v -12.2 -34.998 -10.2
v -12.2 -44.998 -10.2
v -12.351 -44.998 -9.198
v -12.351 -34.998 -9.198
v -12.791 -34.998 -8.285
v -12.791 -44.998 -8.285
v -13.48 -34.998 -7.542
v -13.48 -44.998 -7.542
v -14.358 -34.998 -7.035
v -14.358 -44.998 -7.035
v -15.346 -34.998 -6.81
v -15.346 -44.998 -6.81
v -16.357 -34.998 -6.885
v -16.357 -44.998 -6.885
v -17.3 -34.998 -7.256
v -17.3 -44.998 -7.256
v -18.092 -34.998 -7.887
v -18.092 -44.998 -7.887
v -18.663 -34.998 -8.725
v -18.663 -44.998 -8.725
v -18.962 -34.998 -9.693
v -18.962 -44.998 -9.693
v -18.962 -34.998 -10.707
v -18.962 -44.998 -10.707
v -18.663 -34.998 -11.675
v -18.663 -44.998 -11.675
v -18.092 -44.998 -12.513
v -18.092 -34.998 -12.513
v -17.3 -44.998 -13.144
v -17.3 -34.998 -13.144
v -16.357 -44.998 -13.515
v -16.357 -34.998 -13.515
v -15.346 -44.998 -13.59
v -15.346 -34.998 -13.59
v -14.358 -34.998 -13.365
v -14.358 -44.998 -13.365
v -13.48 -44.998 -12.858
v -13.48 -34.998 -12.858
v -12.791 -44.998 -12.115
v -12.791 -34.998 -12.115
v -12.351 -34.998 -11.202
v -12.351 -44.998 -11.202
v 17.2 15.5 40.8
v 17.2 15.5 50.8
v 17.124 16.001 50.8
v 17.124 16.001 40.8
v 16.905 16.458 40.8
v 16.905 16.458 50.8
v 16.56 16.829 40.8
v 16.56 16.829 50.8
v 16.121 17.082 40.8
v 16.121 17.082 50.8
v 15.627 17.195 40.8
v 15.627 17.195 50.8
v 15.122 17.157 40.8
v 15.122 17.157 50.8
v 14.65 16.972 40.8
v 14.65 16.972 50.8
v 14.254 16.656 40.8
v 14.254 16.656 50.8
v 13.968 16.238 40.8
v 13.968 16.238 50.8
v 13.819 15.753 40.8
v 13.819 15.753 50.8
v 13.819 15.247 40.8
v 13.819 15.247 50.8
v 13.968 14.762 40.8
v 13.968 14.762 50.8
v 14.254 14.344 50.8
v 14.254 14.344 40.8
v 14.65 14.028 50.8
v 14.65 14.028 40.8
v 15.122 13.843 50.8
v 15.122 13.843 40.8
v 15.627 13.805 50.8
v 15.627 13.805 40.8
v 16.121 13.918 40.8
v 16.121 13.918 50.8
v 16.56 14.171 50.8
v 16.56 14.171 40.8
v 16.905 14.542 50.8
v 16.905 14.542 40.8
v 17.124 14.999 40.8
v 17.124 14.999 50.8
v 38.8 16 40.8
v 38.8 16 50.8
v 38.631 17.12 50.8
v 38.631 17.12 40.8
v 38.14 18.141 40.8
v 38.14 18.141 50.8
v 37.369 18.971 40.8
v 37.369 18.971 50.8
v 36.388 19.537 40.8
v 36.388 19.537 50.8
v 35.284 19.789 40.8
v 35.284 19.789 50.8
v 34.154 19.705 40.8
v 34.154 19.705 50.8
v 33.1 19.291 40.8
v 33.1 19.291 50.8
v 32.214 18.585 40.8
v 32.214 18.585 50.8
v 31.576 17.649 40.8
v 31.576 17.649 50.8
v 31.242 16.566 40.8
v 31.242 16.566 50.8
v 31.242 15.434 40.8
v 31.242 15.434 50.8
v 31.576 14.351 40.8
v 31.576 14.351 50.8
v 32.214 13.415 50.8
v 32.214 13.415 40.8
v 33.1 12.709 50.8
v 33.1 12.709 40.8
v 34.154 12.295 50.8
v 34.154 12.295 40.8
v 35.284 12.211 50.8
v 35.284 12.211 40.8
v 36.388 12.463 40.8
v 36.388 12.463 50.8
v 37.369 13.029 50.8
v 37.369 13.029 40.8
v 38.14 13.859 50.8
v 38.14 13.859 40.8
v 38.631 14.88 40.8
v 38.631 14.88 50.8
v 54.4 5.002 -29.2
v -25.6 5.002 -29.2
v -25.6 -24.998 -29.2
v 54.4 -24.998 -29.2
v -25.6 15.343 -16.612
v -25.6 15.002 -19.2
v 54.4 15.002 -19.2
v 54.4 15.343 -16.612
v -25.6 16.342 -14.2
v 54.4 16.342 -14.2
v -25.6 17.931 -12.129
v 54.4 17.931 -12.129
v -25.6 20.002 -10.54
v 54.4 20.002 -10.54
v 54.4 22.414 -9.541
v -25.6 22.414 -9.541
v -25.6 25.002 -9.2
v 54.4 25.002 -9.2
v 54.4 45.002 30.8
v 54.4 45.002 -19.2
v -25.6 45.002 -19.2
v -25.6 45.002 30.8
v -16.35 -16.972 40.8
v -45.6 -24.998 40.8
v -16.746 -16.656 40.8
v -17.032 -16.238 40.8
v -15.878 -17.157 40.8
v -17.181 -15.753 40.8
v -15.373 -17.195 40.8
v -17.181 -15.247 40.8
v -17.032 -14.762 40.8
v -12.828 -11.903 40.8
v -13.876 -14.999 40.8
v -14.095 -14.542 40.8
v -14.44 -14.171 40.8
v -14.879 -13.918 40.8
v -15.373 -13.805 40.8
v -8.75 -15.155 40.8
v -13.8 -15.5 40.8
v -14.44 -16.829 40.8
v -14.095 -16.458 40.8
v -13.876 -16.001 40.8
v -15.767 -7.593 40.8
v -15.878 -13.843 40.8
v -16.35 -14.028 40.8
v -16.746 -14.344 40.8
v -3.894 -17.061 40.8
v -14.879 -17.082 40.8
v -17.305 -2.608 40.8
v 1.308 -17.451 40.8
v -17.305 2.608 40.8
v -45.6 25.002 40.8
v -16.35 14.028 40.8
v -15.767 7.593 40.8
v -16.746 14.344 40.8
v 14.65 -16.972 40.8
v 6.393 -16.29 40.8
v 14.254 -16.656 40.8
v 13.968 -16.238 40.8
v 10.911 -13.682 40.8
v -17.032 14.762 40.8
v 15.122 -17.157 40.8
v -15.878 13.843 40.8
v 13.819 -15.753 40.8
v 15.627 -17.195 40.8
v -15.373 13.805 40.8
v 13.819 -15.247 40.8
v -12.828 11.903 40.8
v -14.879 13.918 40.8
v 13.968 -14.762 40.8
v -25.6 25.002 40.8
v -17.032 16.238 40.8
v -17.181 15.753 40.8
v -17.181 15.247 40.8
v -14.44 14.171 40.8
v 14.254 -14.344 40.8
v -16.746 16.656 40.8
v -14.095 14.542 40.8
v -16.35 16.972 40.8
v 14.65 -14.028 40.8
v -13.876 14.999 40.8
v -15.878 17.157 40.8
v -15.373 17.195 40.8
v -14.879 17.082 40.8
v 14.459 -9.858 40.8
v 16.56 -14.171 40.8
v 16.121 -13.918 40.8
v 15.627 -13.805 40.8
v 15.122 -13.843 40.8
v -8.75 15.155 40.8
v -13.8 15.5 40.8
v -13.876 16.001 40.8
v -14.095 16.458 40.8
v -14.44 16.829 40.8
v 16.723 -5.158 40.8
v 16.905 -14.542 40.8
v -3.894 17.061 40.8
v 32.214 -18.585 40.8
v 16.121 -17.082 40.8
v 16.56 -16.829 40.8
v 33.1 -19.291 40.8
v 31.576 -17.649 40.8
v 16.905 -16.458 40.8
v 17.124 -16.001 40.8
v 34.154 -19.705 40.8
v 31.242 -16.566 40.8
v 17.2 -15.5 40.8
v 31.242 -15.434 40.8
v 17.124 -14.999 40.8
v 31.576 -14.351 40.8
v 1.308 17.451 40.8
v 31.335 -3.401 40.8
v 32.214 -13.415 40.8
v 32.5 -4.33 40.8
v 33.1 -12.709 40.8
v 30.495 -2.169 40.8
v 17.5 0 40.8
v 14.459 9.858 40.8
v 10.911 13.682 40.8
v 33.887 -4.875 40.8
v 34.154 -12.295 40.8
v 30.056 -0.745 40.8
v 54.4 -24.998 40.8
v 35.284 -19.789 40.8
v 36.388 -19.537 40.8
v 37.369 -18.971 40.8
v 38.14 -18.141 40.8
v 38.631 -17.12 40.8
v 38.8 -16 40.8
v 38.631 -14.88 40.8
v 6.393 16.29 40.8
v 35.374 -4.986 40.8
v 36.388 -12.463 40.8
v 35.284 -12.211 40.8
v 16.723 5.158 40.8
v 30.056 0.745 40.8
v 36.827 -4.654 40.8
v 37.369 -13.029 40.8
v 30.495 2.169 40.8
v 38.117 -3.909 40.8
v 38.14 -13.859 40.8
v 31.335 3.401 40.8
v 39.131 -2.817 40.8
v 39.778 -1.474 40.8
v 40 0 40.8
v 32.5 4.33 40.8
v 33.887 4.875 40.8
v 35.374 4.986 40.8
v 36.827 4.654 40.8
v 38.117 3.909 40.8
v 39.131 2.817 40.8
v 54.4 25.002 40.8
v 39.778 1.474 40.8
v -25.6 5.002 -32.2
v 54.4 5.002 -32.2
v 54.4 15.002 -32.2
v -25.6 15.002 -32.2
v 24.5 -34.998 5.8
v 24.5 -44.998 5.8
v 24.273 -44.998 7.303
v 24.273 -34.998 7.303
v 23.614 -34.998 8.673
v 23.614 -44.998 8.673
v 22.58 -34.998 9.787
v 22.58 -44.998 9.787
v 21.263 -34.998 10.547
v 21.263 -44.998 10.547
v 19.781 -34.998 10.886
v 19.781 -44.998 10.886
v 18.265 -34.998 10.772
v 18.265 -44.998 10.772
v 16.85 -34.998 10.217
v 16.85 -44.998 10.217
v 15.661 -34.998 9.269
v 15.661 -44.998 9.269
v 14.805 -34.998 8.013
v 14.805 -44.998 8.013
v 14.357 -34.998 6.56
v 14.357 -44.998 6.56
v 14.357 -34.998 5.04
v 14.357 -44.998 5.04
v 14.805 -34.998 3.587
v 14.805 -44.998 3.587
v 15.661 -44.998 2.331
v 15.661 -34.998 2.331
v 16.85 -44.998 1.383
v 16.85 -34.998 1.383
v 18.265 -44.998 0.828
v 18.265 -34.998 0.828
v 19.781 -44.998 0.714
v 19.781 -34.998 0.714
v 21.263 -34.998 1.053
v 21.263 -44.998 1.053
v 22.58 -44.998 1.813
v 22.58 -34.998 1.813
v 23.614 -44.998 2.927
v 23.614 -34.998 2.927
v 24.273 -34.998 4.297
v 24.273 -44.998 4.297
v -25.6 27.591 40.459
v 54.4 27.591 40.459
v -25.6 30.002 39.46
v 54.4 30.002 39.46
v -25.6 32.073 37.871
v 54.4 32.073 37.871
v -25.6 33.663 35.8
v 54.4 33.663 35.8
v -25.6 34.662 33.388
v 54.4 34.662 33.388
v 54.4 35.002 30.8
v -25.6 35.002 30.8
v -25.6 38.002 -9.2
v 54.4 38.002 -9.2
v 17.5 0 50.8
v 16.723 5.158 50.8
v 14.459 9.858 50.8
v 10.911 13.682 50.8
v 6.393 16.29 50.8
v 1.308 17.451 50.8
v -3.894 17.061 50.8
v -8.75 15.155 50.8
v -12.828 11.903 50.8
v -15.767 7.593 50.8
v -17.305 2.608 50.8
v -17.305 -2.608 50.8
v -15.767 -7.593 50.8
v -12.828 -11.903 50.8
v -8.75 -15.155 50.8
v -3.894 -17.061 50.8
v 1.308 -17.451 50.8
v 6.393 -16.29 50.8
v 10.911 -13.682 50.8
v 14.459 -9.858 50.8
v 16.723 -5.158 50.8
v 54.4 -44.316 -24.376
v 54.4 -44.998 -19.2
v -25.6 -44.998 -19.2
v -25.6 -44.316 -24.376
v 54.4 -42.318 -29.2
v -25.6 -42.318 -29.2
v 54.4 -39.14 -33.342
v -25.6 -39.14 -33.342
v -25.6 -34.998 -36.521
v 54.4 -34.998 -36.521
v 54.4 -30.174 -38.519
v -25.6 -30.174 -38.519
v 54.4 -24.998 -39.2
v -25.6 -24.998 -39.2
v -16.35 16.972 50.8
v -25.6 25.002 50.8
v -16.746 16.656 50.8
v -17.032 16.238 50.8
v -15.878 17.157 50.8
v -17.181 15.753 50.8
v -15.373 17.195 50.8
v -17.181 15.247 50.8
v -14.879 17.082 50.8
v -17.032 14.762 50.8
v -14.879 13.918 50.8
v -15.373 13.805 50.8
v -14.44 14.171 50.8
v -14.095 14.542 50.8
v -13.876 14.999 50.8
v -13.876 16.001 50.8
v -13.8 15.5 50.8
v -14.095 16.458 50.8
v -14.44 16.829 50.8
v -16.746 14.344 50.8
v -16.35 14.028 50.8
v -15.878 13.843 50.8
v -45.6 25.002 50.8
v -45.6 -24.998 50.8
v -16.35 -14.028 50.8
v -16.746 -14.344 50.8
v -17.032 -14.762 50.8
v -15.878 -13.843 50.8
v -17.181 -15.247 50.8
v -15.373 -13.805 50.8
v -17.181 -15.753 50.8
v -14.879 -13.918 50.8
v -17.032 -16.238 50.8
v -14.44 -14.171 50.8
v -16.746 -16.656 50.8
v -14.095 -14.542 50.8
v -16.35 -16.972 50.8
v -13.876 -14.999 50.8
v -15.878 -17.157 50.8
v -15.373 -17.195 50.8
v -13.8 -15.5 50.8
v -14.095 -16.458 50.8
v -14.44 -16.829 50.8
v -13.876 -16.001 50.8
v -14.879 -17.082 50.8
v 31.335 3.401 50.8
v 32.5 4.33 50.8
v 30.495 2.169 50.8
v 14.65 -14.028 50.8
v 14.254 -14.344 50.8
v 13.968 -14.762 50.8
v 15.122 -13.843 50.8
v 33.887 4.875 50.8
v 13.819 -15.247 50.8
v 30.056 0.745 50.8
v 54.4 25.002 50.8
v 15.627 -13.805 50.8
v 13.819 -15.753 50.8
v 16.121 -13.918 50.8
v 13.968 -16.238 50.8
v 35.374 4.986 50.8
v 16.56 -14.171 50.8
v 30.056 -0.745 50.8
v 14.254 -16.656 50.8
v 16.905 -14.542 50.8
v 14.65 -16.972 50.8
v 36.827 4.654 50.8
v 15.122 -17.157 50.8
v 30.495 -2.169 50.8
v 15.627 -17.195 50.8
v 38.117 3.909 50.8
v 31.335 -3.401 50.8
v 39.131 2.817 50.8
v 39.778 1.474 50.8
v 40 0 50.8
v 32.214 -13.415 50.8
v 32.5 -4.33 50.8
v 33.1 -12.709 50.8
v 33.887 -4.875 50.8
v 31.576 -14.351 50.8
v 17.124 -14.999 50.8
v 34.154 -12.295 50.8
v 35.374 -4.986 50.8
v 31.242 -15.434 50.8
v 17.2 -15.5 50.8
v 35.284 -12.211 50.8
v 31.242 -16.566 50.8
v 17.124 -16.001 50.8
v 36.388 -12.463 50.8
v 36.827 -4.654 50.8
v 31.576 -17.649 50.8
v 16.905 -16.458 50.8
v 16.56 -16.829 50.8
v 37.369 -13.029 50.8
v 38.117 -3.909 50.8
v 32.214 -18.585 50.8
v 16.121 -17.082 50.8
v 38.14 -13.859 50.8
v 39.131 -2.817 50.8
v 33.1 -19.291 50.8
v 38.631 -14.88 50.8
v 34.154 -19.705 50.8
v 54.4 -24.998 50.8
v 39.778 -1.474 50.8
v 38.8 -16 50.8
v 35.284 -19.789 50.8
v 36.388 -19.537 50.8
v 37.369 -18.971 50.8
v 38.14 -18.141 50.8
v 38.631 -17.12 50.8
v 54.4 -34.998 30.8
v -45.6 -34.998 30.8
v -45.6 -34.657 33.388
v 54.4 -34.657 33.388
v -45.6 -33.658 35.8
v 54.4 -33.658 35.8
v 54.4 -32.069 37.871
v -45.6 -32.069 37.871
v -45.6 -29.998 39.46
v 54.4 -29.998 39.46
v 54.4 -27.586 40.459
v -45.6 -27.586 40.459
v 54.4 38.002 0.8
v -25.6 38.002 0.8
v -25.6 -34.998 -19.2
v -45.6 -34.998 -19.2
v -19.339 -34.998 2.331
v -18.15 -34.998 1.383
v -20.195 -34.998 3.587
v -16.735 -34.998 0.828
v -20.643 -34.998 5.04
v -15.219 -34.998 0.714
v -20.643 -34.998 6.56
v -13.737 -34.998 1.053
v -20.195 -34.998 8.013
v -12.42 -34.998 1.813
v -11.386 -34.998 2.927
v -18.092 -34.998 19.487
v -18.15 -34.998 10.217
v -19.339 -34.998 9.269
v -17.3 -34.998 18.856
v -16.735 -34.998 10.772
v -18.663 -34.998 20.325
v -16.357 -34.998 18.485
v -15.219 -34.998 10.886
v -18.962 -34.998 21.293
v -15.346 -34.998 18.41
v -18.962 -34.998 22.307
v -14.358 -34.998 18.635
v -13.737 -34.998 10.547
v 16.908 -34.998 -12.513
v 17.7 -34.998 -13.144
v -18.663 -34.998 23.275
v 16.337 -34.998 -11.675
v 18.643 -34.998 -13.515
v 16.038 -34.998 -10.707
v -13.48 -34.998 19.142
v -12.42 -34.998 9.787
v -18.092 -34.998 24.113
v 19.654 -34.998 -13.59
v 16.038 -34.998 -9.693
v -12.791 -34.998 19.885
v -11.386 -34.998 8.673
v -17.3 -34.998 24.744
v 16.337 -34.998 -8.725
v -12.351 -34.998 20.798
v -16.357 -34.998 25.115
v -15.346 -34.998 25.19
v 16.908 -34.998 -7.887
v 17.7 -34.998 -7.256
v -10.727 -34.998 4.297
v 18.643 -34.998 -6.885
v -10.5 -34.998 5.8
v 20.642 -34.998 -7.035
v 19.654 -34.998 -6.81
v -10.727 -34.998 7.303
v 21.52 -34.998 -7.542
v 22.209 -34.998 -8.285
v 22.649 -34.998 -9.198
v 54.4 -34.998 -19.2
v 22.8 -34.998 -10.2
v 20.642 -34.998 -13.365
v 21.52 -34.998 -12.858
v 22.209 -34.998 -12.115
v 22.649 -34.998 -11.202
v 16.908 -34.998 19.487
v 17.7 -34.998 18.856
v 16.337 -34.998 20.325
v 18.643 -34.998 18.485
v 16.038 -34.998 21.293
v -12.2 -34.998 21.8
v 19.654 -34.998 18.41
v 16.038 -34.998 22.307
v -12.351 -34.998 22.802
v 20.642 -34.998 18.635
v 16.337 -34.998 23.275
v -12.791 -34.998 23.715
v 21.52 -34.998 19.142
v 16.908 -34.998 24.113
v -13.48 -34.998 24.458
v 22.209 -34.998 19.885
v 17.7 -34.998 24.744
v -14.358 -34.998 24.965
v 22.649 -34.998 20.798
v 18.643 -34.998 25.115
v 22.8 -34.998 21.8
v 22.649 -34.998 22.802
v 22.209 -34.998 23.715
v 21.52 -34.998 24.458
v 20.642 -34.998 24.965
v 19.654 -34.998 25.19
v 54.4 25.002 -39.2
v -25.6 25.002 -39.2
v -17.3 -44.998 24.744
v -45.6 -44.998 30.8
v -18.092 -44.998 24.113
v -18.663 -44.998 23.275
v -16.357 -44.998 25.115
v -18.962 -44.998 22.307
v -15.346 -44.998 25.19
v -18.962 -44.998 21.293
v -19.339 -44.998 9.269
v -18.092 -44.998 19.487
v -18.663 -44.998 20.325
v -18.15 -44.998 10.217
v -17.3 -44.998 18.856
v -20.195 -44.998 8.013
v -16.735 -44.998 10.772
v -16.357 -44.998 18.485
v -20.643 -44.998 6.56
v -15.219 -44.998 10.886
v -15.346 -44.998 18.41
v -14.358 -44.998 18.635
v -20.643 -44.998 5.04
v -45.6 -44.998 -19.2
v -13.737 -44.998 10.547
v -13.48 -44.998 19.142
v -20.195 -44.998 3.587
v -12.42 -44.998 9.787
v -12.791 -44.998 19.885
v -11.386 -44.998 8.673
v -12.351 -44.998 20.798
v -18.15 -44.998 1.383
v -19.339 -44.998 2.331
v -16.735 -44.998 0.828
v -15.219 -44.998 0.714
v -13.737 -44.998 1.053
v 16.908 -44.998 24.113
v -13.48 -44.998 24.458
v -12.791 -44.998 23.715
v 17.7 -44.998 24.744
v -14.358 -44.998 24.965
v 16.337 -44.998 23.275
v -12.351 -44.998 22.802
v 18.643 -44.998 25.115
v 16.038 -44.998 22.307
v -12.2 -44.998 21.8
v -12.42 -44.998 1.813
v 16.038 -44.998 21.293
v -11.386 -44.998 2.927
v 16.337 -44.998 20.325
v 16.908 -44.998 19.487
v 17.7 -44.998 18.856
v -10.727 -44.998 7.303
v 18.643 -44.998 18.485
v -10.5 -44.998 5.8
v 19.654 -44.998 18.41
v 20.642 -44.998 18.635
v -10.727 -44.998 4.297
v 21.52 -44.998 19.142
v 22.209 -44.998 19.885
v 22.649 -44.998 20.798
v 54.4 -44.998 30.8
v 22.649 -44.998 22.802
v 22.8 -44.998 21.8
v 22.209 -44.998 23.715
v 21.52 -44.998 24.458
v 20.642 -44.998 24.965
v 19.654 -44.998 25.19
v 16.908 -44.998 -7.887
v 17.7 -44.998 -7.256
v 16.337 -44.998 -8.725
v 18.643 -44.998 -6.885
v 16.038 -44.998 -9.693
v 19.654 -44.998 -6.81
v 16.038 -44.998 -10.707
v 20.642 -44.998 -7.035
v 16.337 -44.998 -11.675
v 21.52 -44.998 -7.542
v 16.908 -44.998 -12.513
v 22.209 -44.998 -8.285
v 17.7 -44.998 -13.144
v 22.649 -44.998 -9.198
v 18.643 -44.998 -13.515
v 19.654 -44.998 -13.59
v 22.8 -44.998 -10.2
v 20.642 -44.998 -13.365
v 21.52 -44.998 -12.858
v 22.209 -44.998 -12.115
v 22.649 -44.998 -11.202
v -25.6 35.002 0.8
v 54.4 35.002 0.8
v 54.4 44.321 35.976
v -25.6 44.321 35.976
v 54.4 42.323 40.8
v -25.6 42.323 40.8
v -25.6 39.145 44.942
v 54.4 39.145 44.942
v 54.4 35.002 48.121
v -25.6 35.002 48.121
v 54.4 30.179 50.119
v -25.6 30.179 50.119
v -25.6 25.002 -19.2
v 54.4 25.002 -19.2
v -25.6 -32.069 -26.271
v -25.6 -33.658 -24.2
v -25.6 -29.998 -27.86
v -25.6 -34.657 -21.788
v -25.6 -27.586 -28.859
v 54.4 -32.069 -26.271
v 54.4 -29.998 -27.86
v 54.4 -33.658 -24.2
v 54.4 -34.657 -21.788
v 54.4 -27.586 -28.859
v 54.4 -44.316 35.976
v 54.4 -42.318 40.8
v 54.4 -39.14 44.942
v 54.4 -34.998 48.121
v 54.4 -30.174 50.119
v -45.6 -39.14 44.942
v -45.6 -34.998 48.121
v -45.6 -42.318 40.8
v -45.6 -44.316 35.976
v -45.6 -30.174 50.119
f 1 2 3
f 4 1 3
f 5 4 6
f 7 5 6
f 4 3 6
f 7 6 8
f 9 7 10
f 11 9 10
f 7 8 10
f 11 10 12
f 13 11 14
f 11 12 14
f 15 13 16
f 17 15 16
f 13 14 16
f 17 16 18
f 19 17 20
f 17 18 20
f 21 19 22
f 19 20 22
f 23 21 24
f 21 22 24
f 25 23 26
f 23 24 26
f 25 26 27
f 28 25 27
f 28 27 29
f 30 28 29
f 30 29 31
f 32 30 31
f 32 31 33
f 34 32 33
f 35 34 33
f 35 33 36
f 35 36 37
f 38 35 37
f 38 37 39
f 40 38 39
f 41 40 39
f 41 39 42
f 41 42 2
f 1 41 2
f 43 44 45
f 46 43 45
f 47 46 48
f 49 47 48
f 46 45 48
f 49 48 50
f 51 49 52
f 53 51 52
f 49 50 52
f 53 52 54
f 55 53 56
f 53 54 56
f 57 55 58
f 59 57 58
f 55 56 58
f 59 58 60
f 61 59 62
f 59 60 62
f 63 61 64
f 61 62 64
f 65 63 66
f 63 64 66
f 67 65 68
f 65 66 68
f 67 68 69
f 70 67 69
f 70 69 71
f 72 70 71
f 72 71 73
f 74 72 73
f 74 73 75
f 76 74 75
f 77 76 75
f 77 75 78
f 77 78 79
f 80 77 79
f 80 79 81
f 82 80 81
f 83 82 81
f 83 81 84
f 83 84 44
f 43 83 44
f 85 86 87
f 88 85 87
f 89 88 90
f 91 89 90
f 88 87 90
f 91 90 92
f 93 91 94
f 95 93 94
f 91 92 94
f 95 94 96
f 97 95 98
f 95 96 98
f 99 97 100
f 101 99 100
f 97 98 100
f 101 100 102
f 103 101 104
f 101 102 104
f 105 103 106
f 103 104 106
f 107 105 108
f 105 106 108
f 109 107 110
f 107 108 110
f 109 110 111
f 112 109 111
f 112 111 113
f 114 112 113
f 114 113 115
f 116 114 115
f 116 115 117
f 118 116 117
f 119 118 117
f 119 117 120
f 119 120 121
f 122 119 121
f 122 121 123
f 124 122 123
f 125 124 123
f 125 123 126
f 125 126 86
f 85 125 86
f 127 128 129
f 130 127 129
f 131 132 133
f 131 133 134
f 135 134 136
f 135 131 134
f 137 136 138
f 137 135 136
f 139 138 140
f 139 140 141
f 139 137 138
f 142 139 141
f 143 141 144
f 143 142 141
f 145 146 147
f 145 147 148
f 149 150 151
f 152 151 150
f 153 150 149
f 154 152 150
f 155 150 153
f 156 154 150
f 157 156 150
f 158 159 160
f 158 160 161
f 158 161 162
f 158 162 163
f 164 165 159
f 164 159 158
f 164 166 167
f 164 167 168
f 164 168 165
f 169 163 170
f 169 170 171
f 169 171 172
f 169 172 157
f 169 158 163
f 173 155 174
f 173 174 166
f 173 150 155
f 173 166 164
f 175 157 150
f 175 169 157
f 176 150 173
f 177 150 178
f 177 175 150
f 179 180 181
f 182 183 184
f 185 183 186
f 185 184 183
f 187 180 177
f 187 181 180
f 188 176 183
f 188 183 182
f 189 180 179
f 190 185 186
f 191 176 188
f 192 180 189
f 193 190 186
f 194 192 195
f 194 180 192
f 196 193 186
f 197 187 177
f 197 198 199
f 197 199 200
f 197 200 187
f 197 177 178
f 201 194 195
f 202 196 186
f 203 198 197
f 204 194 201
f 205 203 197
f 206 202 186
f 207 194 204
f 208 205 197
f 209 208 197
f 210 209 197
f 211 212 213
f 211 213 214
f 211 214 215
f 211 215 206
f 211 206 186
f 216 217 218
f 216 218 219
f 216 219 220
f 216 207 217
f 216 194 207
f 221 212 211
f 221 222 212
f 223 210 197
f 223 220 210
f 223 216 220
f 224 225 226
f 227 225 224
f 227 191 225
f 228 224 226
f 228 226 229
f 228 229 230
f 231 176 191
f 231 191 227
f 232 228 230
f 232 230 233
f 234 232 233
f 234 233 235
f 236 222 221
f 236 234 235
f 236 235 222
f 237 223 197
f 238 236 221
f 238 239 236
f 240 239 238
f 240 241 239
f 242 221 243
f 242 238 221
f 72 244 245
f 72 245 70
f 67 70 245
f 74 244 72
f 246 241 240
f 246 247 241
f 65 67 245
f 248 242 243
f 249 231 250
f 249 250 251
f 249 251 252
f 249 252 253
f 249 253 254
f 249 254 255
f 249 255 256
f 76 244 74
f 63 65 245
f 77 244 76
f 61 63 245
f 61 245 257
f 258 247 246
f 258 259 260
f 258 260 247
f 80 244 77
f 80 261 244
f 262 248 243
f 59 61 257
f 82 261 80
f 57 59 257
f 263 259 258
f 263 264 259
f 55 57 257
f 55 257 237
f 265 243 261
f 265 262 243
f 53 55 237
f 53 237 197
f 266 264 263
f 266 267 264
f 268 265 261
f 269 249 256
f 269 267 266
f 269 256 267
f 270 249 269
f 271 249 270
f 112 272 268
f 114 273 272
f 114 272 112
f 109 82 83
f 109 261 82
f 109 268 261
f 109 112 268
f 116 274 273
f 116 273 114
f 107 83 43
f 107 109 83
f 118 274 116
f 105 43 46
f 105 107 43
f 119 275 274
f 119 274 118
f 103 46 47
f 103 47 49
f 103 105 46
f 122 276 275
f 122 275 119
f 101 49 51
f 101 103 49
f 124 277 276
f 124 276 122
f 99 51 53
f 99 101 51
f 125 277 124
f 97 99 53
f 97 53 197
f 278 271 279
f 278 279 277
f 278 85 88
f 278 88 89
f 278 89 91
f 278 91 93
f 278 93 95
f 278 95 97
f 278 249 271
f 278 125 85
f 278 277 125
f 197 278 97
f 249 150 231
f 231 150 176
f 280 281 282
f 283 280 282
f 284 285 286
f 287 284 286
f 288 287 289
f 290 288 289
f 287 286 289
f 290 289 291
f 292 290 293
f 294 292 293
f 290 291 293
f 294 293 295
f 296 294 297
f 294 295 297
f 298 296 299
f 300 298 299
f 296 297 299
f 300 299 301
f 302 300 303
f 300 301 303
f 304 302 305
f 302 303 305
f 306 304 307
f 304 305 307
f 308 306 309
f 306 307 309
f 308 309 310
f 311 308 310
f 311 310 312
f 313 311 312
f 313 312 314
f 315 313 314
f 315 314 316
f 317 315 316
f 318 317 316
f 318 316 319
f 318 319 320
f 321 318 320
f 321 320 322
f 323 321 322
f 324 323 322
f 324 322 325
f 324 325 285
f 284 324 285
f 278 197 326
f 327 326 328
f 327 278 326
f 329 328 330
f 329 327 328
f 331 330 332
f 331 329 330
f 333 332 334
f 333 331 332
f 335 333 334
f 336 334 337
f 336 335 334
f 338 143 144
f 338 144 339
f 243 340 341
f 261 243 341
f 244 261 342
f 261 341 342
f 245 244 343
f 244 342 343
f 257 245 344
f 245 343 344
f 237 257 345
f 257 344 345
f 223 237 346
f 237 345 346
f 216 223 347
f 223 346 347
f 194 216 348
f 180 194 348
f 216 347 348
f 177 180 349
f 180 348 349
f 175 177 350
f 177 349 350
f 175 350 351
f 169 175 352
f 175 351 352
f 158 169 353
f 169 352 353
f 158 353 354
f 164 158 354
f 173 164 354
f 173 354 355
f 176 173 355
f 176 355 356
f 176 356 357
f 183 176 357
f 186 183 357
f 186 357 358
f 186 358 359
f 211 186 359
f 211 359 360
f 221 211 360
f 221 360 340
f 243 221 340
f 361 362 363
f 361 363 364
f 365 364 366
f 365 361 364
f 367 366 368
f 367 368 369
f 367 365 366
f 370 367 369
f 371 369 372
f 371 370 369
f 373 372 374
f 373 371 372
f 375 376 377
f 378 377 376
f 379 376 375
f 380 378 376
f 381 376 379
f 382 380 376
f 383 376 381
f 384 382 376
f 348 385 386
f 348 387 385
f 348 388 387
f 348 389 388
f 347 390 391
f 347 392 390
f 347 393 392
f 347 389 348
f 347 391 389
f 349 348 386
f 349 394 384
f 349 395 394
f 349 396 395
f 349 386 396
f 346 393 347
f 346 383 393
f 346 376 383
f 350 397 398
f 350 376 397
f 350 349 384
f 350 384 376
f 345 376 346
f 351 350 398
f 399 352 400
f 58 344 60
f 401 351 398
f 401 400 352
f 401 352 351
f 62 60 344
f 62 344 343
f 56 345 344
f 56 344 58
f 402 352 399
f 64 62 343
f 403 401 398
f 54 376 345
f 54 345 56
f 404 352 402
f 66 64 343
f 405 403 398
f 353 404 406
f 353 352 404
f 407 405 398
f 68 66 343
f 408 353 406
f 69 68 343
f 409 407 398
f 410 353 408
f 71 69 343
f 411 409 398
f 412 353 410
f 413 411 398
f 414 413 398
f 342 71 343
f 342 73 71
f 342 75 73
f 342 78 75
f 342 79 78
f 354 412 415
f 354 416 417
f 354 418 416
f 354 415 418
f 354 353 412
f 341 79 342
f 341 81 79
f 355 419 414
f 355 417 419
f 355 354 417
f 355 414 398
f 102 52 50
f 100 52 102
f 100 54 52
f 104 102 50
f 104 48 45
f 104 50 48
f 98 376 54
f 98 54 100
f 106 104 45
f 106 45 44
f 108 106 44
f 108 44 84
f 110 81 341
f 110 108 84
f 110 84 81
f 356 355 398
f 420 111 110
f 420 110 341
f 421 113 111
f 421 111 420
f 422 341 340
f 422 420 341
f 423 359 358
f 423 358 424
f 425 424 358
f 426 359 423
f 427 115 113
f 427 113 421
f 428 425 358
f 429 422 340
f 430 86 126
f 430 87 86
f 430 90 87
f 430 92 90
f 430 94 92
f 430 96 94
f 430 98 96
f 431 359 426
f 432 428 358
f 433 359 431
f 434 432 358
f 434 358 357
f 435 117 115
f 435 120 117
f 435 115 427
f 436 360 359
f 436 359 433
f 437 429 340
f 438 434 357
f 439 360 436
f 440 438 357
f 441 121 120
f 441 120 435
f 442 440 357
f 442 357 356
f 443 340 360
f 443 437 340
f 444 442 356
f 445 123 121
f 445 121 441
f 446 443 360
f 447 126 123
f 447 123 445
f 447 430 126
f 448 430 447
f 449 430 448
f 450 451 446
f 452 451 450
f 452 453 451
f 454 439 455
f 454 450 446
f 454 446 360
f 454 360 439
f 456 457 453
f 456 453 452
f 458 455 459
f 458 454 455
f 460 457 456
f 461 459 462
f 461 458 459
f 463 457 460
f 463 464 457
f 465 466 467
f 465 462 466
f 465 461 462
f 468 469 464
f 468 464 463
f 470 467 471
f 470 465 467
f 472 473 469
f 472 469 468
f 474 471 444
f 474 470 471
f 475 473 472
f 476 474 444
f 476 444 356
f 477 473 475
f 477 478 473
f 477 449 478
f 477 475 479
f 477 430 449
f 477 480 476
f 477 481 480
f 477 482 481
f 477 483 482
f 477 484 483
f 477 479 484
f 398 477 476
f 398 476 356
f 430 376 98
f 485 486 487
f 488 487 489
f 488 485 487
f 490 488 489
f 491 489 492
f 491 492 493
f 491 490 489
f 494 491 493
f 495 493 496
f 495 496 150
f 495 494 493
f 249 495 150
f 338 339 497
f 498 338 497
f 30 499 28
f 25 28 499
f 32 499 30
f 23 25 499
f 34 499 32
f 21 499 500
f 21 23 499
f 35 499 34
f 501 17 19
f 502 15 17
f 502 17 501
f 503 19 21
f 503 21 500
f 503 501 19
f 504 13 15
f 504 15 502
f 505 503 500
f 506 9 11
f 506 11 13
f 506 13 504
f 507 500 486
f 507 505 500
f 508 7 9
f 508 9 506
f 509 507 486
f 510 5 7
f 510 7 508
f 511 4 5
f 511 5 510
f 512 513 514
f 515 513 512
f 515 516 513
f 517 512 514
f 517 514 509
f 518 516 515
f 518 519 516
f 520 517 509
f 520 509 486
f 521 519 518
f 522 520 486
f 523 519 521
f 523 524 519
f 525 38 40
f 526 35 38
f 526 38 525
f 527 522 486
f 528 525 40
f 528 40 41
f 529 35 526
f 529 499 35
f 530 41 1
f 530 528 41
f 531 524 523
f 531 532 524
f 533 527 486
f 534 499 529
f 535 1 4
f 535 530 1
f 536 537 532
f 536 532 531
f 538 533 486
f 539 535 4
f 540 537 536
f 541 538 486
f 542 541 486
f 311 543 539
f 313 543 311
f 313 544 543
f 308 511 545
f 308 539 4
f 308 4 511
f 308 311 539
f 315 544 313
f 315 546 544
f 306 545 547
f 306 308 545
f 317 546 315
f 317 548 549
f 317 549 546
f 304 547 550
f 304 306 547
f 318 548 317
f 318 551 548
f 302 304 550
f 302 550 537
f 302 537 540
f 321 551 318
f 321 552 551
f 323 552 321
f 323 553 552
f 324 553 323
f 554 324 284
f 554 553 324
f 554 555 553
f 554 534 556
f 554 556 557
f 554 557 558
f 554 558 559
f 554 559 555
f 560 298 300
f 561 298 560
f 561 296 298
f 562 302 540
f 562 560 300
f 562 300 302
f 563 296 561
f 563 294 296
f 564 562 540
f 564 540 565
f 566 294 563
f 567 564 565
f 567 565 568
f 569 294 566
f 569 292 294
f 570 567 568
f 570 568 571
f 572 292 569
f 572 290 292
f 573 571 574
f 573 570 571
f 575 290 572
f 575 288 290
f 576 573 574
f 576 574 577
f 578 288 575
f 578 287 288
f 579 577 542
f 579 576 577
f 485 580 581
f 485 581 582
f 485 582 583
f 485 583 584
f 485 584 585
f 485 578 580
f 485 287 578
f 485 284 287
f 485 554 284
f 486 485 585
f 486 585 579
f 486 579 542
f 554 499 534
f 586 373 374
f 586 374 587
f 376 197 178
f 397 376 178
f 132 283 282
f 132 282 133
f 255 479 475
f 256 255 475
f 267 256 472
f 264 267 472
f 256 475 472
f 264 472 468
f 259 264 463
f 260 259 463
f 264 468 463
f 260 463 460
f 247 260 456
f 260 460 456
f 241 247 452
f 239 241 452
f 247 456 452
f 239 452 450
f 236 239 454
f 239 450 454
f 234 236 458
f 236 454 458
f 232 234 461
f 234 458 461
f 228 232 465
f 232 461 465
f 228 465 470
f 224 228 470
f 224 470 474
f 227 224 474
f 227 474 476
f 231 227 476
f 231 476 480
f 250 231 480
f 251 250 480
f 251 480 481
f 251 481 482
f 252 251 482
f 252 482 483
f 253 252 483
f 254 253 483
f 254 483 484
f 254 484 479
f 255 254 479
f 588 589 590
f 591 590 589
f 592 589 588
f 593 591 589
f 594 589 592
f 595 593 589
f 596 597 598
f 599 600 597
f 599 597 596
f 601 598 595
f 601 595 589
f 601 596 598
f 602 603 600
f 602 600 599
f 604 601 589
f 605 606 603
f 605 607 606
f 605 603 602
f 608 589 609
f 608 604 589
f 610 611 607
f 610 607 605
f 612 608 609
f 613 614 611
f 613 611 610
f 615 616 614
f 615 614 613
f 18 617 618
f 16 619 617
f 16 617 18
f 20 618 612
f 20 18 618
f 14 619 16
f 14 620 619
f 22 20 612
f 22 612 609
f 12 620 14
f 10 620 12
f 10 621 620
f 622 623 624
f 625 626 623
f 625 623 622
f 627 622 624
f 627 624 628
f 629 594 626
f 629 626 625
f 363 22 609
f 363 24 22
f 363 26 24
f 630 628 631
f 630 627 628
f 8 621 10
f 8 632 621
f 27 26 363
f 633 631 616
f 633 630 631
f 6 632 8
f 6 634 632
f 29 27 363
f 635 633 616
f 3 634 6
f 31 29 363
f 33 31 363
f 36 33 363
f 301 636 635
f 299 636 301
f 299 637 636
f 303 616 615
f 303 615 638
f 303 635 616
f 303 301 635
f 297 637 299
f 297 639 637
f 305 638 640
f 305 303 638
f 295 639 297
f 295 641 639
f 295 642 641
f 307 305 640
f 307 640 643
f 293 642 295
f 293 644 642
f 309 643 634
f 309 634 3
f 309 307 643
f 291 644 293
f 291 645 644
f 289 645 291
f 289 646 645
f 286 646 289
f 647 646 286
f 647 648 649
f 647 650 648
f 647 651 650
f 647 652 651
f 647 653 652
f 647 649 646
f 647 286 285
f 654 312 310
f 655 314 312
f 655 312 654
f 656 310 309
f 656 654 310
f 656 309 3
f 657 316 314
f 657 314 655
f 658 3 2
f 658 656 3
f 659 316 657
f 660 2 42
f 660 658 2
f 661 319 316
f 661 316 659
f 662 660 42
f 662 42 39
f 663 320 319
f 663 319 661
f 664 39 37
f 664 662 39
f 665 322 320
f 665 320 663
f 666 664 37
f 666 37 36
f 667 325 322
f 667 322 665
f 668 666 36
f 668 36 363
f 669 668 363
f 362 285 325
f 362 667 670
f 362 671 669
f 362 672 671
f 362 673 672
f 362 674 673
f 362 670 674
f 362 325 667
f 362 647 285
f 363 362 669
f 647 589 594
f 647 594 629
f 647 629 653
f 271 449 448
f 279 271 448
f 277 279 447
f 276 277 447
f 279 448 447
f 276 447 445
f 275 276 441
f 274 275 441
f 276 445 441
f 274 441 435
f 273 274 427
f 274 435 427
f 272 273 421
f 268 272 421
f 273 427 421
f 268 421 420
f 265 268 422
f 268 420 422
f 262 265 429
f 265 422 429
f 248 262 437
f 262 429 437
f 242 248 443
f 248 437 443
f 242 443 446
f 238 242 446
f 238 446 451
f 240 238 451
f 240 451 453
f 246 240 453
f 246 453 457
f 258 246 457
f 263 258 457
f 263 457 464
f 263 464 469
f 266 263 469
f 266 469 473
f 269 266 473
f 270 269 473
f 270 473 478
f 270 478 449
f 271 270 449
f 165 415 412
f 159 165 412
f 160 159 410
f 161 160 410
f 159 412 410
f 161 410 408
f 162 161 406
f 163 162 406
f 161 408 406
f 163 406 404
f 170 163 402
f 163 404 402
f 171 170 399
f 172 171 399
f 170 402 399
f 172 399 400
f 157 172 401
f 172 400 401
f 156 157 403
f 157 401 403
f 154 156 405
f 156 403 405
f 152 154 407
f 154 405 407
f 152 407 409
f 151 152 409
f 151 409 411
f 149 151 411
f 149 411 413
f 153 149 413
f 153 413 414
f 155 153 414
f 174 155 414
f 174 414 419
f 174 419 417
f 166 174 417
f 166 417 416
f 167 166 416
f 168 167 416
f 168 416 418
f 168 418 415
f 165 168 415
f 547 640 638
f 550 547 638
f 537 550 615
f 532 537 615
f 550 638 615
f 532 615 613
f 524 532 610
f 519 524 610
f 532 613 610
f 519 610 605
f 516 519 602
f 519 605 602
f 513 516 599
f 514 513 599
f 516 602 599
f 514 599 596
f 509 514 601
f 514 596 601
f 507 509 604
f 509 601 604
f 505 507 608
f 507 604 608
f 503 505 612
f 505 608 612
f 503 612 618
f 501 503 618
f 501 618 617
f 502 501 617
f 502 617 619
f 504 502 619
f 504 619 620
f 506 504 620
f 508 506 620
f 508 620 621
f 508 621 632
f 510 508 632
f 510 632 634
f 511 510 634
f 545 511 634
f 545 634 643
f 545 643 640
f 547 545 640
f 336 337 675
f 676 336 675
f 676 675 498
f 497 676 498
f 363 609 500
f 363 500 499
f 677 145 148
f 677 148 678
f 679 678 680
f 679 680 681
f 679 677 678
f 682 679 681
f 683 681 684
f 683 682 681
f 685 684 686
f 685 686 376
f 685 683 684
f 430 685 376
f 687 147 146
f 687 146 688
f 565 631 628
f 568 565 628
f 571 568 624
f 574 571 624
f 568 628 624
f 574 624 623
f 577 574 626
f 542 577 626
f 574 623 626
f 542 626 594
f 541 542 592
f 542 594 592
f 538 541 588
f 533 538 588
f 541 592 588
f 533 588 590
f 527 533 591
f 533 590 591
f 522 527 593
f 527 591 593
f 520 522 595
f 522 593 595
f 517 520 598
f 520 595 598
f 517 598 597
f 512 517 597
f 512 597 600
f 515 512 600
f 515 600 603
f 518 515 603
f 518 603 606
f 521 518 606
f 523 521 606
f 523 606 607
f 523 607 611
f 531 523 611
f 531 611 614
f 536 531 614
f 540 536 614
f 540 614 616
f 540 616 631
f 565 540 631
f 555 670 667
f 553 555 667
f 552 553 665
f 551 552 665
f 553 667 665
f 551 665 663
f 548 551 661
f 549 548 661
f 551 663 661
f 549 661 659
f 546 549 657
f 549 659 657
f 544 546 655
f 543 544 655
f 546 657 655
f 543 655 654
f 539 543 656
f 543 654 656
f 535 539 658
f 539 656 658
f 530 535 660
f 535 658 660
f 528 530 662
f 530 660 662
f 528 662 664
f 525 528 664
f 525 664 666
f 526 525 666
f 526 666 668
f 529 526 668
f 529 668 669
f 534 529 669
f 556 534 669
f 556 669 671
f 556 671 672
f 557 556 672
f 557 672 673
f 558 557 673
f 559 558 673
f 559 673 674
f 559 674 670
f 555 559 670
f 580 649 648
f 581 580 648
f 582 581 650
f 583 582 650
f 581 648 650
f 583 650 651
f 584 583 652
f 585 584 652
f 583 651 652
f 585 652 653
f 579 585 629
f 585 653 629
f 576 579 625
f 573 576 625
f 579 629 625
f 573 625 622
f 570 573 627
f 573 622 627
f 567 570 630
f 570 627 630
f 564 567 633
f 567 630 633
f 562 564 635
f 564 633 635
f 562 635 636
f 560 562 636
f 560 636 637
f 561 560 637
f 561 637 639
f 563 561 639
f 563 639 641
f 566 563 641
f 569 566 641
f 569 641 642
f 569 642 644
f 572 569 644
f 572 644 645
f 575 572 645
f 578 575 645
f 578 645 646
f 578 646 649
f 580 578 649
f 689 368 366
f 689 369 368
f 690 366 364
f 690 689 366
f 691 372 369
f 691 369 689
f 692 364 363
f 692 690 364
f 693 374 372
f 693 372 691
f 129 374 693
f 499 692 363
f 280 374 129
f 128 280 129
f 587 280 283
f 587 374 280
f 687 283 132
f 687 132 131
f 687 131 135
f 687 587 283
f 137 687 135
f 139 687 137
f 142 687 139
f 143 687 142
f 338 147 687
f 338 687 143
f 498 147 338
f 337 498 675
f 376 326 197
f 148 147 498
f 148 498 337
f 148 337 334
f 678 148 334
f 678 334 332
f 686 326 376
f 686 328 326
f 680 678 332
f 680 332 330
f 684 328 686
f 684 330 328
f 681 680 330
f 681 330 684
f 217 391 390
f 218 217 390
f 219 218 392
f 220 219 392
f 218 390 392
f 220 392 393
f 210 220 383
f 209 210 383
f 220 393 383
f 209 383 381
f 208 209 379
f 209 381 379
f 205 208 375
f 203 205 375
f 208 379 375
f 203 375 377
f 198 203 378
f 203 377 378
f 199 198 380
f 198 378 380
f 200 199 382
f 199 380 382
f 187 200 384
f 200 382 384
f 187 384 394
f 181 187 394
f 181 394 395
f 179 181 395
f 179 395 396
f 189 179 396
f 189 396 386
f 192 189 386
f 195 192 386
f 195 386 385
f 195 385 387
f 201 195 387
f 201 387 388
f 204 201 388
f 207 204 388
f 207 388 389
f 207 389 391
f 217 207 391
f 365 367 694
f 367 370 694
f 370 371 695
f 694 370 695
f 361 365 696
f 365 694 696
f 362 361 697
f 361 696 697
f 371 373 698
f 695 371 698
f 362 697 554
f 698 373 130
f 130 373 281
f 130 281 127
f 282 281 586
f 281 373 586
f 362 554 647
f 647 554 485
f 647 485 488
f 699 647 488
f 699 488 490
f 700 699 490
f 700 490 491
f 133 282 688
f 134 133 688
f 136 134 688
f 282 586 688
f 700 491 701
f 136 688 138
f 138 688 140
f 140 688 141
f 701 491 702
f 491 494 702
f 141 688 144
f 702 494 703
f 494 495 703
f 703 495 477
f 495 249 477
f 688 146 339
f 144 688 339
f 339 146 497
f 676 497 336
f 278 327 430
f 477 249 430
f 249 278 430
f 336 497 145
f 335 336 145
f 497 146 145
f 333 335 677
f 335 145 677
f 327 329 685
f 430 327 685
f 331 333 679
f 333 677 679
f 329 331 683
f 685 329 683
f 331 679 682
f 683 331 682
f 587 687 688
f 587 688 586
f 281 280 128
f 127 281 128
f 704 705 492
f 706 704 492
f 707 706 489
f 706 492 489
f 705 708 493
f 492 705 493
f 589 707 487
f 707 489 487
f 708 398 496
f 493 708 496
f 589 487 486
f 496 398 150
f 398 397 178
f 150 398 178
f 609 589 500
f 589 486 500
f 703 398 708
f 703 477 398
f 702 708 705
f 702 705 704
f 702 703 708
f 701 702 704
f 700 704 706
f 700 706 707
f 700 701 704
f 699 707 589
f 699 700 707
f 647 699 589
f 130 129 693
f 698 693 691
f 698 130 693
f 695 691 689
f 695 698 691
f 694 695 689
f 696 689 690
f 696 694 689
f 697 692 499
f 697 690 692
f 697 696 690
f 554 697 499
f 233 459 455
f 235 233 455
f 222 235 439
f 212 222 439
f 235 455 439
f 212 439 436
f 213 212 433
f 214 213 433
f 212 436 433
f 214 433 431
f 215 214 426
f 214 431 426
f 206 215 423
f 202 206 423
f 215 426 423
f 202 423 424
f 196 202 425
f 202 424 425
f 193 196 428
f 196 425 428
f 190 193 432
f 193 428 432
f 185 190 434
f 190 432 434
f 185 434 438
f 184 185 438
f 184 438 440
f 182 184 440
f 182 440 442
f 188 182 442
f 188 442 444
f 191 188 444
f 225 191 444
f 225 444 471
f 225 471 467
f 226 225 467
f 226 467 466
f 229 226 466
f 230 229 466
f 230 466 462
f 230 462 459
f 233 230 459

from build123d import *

# Parameters (mm, degrees)
BOSS_EXTRUDE1_DEPTH      = 54.4
BOSS_EXTRUDE1_DEPTH_BACK = 45.6
CUT_EXTRUDE1_REACH       = 92
SKETCH3_R                = 3.8
SKETCH3_R_2              = 5
SKETCH3_R_3              = 17.5
SKETCH3_R_4              = 1.7
CUT_EXTRUDE2_REACH       = 92
SKETCH4_R                = 5.1
SKETCH4_R_2              = 5.099999999
SKETCH4_R_3              = 3.4
SKETCH6_W                = 20
SKETCH6_H                = 20
CUT_EXTRUDE4_DEPTH       = 91
SKETCH7_W                = 20
SKETCH7_H                = 20
CUT_EXTRUDE5_DEPTH       = 91
SKETCH5_W                = 3
SKETCH5_H                = 20
SKETCH5_W_2              = 20
SKETCH5_H_2              = 3
CUT_EXTRUDE3_DEPTH       = 101
BOSS_EXTRUDE2_DEPTH      = 80


with BuildPart() as part:
    # Sketch2 → Boss-Extrude1 (new body, two sides)
    with BuildSketch(Plane(origin=(0, 0, 0), x_dir=(0, 0, -1), z_dir=(1, 0, 0))) as boss_extrude1_sk:
        with BuildLine():
            Line((-30.8, -44.997596663), (19.2, -44.997596663))
            ThreePointArc((19.2, -44.997596663), (33.342135624, -39.139732287), (39.2, -24.997596663))
            Line((39.2, -24.997596663), (39.2, 25.002403337))
            ThreePointArc((39.2, 25.002403337), (33.342135624, 39.144538961), (19.2, 45.002403337))
            Line((19.2, 45.002403337), (-30.8, 45.002403337))
            ThreePointArc((-30.8, 45.002403337), (-44.942135624, 39.144538961), (-50.8, 25.002403337))
            Line((-50.8, 25.002403337), (-50.8, -24.997596663))
            ThreePointArc((-50.8, -24.997596663), (-44.942135624, -39.139732287), (-30.8, -44.997596663))
        make_face()
        with BuildLine():
            Line((-30.8, 35.002403337), (19.2, 35.002403337))
            ThreePointArc((19.2, 35.002403337), (26.271067812, 32.073471149), (29.2, 25.002403337))
            Line((29.2, 25.002403337), (29.2, -24.997596663))
            ThreePointArc((29.2, -24.997596663), (26.271067812, -32.068664475), (19.2, -34.997596663))
            Line((19.2, -34.997596663), (-30.8, -34.997596663))
            ThreePointArc((-30.8, -34.997596663), (-37.871067812, -32.068664475), (-40.8, -24.997596663))
            Line((-40.8, -24.997596663), (-40.8, 25.002403337))
            ThreePointArc((-40.8, 25.002403337), (-37.871067812, 32.073471149), (-30.8, 35.002403337))
        make_face(mode=Mode.SUBTRACT)
    extrude(amount=BOSS_EXTRUDE1_DEPTH)
    extrude(boss_extrude1_sk.sketch, amount=-BOSS_EXTRUDE1_DEPTH_BACK)

    # Sketch3 → Cut-Extrude1 (cut, up to next)
    with BuildSketch(Plane.XY.offset(50.8), mode=Mode.PRIVATE) as cut_extrude1_sk1:
        with Locations((35, -16)):
            Circle(SKETCH3_R)
    cut_extrude1_tool1 = extrude(cut_extrude1_sk1.sketch, amount=-CUT_EXTRUDE1_REACH, mode=Mode.PRIVATE) & part.part
    add(cut_extrude1_tool1.solids().sort_by_distance((35, -16, 50.8))[0], mode=Mode.SUBTRACT)
    # Sketch3 → Cut-Extrude1 (cut, up to next)
    with BuildSketch(Plane.XY.offset(50.8), mode=Mode.PRIVATE) as cut_extrude1_sk2:
        with Locations((35, 0)):
            Circle(SKETCH3_R_2)
    cut_extrude1_tool2 = extrude(cut_extrude1_sk2.sketch, amount=-CUT_EXTRUDE1_REACH, mode=Mode.PRIVATE) & part.part
    add(cut_extrude1_tool2.solids().sort_by_distance((35, 0, 50.8))[0], mode=Mode.SUBTRACT)
    # Sketch3 → Cut-Extrude1 (cut, up to next)
    with BuildSketch(Plane.XY.offset(50.8), mode=Mode.PRIVATE) as cut_extrude1_sk3:
        with Locations((35, 16)):
            Circle(SKETCH3_R)
    cut_extrude1_tool3 = extrude(cut_extrude1_sk3.sketch, amount=-CUT_EXTRUDE1_REACH, mode=Mode.PRIVATE) & part.part
    add(cut_extrude1_tool3.solids().sort_by_distance((35, 16, 50.8))[0], mode=Mode.SUBTRACT)
    # Sketch3 → Cut-Extrude1 (cut, up to next)
    with BuildSketch(Plane.XY.offset(50.8), mode=Mode.PRIVATE) as cut_extrude1_sk4:
        Circle(SKETCH3_R_3)
    cut_extrude1_tool4 = extrude(cut_extrude1_sk4.sketch, amount=-CUT_EXTRUDE1_REACH, mode=Mode.PRIVATE) & part.part
    add(cut_extrude1_tool4.solids().sort_by_distance((0, 0, 50.8))[0], mode=Mode.SUBTRACT)
    # Sketch3 → Cut-Extrude1 (cut, up to next)
    with BuildSketch(Plane.XY.offset(50.8), mode=Mode.PRIVATE) as cut_extrude1_sk5:
        with Locations((15.5, 15.5)):
            Circle(SKETCH3_R_4)
    cut_extrude1_tool5 = extrude(cut_extrude1_sk5.sketch, amount=-CUT_EXTRUDE1_REACH, mode=Mode.PRIVATE) & part.part
    add(cut_extrude1_tool5.solids().sort_by_distance((15.5, 15.5, 50.8))[0], mode=Mode.SUBTRACT)
    # Sketch3 → Cut-Extrude1 (cut, up to next)
    with BuildSketch(Plane.XY.offset(50.8), mode=Mode.PRIVATE) as cut_extrude1_sk6:
        with Locations((15.5, -15.5)):
            Circle(SKETCH3_R_4)
    cut_extrude1_tool6 = extrude(cut_extrude1_sk6.sketch, amount=-CUT_EXTRUDE1_REACH, mode=Mode.PRIVATE) & part.part
    add(cut_extrude1_tool6.solids().sort_by_distance((15.5, -15.5, 50.8))[0], mode=Mode.SUBTRACT)
    # Sketch3 → Cut-Extrude1 (cut, up to next)
    with BuildSketch(Plane.XY.offset(50.8), mode=Mode.PRIVATE) as cut_extrude1_sk7:
        with Locations((-15.5, 15.5)):
            Circle(SKETCH3_R_4)
    cut_extrude1_tool7 = extrude(cut_extrude1_sk7.sketch, amount=-CUT_EXTRUDE1_REACH, mode=Mode.PRIVATE) & part.part
    add(cut_extrude1_tool7.solids().sort_by_distance((-15.5, 15.5, 50.8))[0], mode=Mode.SUBTRACT)
    # Sketch3 → Cut-Extrude1 (cut, up to next)
    with BuildSketch(Plane.XY.offset(50.8), mode=Mode.PRIVATE) as cut_extrude1_sk8:
        with Locations((-15.5, -15.5)):
            Circle(SKETCH3_R_4)
    cut_extrude1_tool8 = extrude(cut_extrude1_sk8.sketch, amount=-CUT_EXTRUDE1_REACH, mode=Mode.PRIVATE) & part.part
    add(cut_extrude1_tool8.solids().sort_by_distance((-15.5, -15.5, 50.8))[0], mode=Mode.SUBTRACT)

    # Sketch4 → Cut-Extrude2 (cut, up to next)
    with BuildSketch(Plane.XZ.offset(44.997596663), mode=Mode.PRIVATE) as cut_extrude2_sk1:
        with Locations((-15.6, 5.8)):
            Circle(SKETCH4_R)
    cut_extrude2_tool1 = extrude(cut_extrude2_sk1.sketch, amount=-CUT_EXTRUDE2_REACH, mode=Mode.PRIVATE) & part.part
    add(cut_extrude2_tool1.solids().sort_by_distance((-15.6, -44.997597, 5.8))[0], mode=Mode.SUBTRACT)
    # Sketch4 → Cut-Extrude2 (cut, up to next)
    with BuildSketch(Plane.XZ.offset(44.997596663), mode=Mode.PRIVATE) as cut_extrude2_sk2:
        with Locations((19.4, 5.8)):
            Circle(SKETCH4_R_2)
    cut_extrude2_tool2 = extrude(cut_extrude2_sk2.sketch, amount=-CUT_EXTRUDE2_REACH, mode=Mode.PRIVATE) & part.part
    add(cut_extrude2_tool2.solids().sort_by_distance((19.4, -44.997597, 5.8))[0], mode=Mode.SUBTRACT)
    # Sketch4 → Cut-Extrude2 (cut, up to next)
    with BuildSketch(Plane.XZ.offset(44.997596663), mode=Mode.PRIVATE) as cut_extrude2_sk3:
        with Locations((-15.6, 21.8)):
            Circle(SKETCH4_R_3)
    cut_extrude2_tool3 = extrude(cut_extrude2_sk3.sketch, amount=-CUT_EXTRUDE2_REACH, mode=Mode.PRIVATE) & part.part
    add(cut_extrude2_tool3.solids().sort_by_distance((-15.6, -44.997597, 21.8))[0], mode=Mode.SUBTRACT)
    # Sketch4 → Cut-Extrude2 (cut, up to next)
    with BuildSketch(Plane.XZ.offset(44.997596663), mode=Mode.PRIVATE) as cut_extrude2_sk4:
        with Locations((-15.6, -10.2)):
            Circle(SKETCH4_R_3)
    cut_extrude2_tool4 = extrude(cut_extrude2_sk4.sketch, amount=-CUT_EXTRUDE2_REACH, mode=Mode.PRIVATE) & part.part
    add(cut_extrude2_tool4.solids().sort_by_distance((-15.6, -44.997597, -10.2))[0], mode=Mode.SUBTRACT)
    # Sketch4 → Cut-Extrude2 (cut, up to next)
    with BuildSketch(Plane.XZ.offset(44.997596663), mode=Mode.PRIVATE) as cut_extrude2_sk5:
        with Locations((19.4, 21.8)):
            Circle(SKETCH4_R_3)
    cut_extrude2_tool5 = extrude(cut_extrude2_sk5.sketch, amount=-CUT_EXTRUDE2_REACH, mode=Mode.PRIVATE) & part.part
    add(cut_extrude2_tool5.solids().sort_by_distance((19.4, -44.997597, 21.8))[0], mode=Mode.SUBTRACT)
    # Sketch4 → Cut-Extrude2 (cut, up to next)
    with BuildSketch(Plane.XZ.offset(44.997596663), mode=Mode.PRIVATE) as cut_extrude2_sk6:
        with Locations((19.4, -10.2)):
            Circle(SKETCH4_R_3)
    cut_extrude2_tool6 = extrude(cut_extrude2_sk6.sketch, amount=-CUT_EXTRUDE2_REACH, mode=Mode.PRIVATE) & part.part
    add(cut_extrude2_tool6.solids().sort_by_distance((19.4, -44.997597, -10.2))[0], mode=Mode.SUBTRACT)

    # Sketch6 → Cut-Extrude4 (cut, through all)
    with BuildSketch(Plane(origin=(0, 0, -39.2), x_dir=(-1, 0, 0), z_dir=(0, 0, -1))):
        with Locations((35.6, 35.002403337)):
            Rectangle(SKETCH6_W, SKETCH6_H)
    extrude(amount=-CUT_EXTRUDE4_DEPTH, mode=Mode.SUBTRACT)

    # Sketch7 → Cut-Extrude5 (cut, through all)
    with BuildSketch(Plane.XZ.offset(44.997596663)):
        with Locations((-35.6, -29.2)):
            Rectangle(SKETCH7_W, SKETCH7_H)
    extrude(amount=-CUT_EXTRUDE5_DEPTH, mode=Mode.SUBTRACT)

    # Sketch5 → Cut-Extrude3 (cut, through all)
    with BuildSketch(Plane.ZY.offset(45.6)):
        Polygon((-29.2, 25.002403337), (-19.2, 25.002403337), (-19.2, 35.002403337), (-19.2, 38.002403337), (-19.2, 45.002403337), (-39.2, 45.002403337), (-39.2, 25.002403337), (-32.2, 25.002403337), align=None)
        with Locations((-30.7, 15.002403337)):
            Rectangle(SKETCH5_W, SKETCH5_H)
        with Locations((-9.2, 36.502403337)):
            Rectangle(SKETCH5_W_2, SKETCH5_H_2)
    extrude(amount=-CUT_EXTRUDE3_DEPTH, mode=Mode.SUBTRACT)

    # Sketch8 → Boss-Extrude2 (add)
    with BuildSketch(Plane.ZY.offset(25.6)):
        with BuildLine():
            Line((-19.2, 38.002403337), (-19.2, 25.002403337))
            Line((-19.2, 25.002403337), (-32.2, 25.002403337))
            Line((-32.2, 25.002403337), (-32.2, 15.002403337))
            Line((-32.2, 15.002403337), (-19.2, 15.002403337))
            ThreePointArc((-19.2, 15.002403337), (-12.128932188, 17.931335525), (-9.2, 25.002403337))
            Line((-9.2, 25.002403337), (-9.2, 38.002403337))
            Line((-9.2, 38.002403337), (-19.2, 38.002403337))
        make_face()
    extrude(amount=-BOSS_EXTRUDE2_DEPTH)


solid = part.part
